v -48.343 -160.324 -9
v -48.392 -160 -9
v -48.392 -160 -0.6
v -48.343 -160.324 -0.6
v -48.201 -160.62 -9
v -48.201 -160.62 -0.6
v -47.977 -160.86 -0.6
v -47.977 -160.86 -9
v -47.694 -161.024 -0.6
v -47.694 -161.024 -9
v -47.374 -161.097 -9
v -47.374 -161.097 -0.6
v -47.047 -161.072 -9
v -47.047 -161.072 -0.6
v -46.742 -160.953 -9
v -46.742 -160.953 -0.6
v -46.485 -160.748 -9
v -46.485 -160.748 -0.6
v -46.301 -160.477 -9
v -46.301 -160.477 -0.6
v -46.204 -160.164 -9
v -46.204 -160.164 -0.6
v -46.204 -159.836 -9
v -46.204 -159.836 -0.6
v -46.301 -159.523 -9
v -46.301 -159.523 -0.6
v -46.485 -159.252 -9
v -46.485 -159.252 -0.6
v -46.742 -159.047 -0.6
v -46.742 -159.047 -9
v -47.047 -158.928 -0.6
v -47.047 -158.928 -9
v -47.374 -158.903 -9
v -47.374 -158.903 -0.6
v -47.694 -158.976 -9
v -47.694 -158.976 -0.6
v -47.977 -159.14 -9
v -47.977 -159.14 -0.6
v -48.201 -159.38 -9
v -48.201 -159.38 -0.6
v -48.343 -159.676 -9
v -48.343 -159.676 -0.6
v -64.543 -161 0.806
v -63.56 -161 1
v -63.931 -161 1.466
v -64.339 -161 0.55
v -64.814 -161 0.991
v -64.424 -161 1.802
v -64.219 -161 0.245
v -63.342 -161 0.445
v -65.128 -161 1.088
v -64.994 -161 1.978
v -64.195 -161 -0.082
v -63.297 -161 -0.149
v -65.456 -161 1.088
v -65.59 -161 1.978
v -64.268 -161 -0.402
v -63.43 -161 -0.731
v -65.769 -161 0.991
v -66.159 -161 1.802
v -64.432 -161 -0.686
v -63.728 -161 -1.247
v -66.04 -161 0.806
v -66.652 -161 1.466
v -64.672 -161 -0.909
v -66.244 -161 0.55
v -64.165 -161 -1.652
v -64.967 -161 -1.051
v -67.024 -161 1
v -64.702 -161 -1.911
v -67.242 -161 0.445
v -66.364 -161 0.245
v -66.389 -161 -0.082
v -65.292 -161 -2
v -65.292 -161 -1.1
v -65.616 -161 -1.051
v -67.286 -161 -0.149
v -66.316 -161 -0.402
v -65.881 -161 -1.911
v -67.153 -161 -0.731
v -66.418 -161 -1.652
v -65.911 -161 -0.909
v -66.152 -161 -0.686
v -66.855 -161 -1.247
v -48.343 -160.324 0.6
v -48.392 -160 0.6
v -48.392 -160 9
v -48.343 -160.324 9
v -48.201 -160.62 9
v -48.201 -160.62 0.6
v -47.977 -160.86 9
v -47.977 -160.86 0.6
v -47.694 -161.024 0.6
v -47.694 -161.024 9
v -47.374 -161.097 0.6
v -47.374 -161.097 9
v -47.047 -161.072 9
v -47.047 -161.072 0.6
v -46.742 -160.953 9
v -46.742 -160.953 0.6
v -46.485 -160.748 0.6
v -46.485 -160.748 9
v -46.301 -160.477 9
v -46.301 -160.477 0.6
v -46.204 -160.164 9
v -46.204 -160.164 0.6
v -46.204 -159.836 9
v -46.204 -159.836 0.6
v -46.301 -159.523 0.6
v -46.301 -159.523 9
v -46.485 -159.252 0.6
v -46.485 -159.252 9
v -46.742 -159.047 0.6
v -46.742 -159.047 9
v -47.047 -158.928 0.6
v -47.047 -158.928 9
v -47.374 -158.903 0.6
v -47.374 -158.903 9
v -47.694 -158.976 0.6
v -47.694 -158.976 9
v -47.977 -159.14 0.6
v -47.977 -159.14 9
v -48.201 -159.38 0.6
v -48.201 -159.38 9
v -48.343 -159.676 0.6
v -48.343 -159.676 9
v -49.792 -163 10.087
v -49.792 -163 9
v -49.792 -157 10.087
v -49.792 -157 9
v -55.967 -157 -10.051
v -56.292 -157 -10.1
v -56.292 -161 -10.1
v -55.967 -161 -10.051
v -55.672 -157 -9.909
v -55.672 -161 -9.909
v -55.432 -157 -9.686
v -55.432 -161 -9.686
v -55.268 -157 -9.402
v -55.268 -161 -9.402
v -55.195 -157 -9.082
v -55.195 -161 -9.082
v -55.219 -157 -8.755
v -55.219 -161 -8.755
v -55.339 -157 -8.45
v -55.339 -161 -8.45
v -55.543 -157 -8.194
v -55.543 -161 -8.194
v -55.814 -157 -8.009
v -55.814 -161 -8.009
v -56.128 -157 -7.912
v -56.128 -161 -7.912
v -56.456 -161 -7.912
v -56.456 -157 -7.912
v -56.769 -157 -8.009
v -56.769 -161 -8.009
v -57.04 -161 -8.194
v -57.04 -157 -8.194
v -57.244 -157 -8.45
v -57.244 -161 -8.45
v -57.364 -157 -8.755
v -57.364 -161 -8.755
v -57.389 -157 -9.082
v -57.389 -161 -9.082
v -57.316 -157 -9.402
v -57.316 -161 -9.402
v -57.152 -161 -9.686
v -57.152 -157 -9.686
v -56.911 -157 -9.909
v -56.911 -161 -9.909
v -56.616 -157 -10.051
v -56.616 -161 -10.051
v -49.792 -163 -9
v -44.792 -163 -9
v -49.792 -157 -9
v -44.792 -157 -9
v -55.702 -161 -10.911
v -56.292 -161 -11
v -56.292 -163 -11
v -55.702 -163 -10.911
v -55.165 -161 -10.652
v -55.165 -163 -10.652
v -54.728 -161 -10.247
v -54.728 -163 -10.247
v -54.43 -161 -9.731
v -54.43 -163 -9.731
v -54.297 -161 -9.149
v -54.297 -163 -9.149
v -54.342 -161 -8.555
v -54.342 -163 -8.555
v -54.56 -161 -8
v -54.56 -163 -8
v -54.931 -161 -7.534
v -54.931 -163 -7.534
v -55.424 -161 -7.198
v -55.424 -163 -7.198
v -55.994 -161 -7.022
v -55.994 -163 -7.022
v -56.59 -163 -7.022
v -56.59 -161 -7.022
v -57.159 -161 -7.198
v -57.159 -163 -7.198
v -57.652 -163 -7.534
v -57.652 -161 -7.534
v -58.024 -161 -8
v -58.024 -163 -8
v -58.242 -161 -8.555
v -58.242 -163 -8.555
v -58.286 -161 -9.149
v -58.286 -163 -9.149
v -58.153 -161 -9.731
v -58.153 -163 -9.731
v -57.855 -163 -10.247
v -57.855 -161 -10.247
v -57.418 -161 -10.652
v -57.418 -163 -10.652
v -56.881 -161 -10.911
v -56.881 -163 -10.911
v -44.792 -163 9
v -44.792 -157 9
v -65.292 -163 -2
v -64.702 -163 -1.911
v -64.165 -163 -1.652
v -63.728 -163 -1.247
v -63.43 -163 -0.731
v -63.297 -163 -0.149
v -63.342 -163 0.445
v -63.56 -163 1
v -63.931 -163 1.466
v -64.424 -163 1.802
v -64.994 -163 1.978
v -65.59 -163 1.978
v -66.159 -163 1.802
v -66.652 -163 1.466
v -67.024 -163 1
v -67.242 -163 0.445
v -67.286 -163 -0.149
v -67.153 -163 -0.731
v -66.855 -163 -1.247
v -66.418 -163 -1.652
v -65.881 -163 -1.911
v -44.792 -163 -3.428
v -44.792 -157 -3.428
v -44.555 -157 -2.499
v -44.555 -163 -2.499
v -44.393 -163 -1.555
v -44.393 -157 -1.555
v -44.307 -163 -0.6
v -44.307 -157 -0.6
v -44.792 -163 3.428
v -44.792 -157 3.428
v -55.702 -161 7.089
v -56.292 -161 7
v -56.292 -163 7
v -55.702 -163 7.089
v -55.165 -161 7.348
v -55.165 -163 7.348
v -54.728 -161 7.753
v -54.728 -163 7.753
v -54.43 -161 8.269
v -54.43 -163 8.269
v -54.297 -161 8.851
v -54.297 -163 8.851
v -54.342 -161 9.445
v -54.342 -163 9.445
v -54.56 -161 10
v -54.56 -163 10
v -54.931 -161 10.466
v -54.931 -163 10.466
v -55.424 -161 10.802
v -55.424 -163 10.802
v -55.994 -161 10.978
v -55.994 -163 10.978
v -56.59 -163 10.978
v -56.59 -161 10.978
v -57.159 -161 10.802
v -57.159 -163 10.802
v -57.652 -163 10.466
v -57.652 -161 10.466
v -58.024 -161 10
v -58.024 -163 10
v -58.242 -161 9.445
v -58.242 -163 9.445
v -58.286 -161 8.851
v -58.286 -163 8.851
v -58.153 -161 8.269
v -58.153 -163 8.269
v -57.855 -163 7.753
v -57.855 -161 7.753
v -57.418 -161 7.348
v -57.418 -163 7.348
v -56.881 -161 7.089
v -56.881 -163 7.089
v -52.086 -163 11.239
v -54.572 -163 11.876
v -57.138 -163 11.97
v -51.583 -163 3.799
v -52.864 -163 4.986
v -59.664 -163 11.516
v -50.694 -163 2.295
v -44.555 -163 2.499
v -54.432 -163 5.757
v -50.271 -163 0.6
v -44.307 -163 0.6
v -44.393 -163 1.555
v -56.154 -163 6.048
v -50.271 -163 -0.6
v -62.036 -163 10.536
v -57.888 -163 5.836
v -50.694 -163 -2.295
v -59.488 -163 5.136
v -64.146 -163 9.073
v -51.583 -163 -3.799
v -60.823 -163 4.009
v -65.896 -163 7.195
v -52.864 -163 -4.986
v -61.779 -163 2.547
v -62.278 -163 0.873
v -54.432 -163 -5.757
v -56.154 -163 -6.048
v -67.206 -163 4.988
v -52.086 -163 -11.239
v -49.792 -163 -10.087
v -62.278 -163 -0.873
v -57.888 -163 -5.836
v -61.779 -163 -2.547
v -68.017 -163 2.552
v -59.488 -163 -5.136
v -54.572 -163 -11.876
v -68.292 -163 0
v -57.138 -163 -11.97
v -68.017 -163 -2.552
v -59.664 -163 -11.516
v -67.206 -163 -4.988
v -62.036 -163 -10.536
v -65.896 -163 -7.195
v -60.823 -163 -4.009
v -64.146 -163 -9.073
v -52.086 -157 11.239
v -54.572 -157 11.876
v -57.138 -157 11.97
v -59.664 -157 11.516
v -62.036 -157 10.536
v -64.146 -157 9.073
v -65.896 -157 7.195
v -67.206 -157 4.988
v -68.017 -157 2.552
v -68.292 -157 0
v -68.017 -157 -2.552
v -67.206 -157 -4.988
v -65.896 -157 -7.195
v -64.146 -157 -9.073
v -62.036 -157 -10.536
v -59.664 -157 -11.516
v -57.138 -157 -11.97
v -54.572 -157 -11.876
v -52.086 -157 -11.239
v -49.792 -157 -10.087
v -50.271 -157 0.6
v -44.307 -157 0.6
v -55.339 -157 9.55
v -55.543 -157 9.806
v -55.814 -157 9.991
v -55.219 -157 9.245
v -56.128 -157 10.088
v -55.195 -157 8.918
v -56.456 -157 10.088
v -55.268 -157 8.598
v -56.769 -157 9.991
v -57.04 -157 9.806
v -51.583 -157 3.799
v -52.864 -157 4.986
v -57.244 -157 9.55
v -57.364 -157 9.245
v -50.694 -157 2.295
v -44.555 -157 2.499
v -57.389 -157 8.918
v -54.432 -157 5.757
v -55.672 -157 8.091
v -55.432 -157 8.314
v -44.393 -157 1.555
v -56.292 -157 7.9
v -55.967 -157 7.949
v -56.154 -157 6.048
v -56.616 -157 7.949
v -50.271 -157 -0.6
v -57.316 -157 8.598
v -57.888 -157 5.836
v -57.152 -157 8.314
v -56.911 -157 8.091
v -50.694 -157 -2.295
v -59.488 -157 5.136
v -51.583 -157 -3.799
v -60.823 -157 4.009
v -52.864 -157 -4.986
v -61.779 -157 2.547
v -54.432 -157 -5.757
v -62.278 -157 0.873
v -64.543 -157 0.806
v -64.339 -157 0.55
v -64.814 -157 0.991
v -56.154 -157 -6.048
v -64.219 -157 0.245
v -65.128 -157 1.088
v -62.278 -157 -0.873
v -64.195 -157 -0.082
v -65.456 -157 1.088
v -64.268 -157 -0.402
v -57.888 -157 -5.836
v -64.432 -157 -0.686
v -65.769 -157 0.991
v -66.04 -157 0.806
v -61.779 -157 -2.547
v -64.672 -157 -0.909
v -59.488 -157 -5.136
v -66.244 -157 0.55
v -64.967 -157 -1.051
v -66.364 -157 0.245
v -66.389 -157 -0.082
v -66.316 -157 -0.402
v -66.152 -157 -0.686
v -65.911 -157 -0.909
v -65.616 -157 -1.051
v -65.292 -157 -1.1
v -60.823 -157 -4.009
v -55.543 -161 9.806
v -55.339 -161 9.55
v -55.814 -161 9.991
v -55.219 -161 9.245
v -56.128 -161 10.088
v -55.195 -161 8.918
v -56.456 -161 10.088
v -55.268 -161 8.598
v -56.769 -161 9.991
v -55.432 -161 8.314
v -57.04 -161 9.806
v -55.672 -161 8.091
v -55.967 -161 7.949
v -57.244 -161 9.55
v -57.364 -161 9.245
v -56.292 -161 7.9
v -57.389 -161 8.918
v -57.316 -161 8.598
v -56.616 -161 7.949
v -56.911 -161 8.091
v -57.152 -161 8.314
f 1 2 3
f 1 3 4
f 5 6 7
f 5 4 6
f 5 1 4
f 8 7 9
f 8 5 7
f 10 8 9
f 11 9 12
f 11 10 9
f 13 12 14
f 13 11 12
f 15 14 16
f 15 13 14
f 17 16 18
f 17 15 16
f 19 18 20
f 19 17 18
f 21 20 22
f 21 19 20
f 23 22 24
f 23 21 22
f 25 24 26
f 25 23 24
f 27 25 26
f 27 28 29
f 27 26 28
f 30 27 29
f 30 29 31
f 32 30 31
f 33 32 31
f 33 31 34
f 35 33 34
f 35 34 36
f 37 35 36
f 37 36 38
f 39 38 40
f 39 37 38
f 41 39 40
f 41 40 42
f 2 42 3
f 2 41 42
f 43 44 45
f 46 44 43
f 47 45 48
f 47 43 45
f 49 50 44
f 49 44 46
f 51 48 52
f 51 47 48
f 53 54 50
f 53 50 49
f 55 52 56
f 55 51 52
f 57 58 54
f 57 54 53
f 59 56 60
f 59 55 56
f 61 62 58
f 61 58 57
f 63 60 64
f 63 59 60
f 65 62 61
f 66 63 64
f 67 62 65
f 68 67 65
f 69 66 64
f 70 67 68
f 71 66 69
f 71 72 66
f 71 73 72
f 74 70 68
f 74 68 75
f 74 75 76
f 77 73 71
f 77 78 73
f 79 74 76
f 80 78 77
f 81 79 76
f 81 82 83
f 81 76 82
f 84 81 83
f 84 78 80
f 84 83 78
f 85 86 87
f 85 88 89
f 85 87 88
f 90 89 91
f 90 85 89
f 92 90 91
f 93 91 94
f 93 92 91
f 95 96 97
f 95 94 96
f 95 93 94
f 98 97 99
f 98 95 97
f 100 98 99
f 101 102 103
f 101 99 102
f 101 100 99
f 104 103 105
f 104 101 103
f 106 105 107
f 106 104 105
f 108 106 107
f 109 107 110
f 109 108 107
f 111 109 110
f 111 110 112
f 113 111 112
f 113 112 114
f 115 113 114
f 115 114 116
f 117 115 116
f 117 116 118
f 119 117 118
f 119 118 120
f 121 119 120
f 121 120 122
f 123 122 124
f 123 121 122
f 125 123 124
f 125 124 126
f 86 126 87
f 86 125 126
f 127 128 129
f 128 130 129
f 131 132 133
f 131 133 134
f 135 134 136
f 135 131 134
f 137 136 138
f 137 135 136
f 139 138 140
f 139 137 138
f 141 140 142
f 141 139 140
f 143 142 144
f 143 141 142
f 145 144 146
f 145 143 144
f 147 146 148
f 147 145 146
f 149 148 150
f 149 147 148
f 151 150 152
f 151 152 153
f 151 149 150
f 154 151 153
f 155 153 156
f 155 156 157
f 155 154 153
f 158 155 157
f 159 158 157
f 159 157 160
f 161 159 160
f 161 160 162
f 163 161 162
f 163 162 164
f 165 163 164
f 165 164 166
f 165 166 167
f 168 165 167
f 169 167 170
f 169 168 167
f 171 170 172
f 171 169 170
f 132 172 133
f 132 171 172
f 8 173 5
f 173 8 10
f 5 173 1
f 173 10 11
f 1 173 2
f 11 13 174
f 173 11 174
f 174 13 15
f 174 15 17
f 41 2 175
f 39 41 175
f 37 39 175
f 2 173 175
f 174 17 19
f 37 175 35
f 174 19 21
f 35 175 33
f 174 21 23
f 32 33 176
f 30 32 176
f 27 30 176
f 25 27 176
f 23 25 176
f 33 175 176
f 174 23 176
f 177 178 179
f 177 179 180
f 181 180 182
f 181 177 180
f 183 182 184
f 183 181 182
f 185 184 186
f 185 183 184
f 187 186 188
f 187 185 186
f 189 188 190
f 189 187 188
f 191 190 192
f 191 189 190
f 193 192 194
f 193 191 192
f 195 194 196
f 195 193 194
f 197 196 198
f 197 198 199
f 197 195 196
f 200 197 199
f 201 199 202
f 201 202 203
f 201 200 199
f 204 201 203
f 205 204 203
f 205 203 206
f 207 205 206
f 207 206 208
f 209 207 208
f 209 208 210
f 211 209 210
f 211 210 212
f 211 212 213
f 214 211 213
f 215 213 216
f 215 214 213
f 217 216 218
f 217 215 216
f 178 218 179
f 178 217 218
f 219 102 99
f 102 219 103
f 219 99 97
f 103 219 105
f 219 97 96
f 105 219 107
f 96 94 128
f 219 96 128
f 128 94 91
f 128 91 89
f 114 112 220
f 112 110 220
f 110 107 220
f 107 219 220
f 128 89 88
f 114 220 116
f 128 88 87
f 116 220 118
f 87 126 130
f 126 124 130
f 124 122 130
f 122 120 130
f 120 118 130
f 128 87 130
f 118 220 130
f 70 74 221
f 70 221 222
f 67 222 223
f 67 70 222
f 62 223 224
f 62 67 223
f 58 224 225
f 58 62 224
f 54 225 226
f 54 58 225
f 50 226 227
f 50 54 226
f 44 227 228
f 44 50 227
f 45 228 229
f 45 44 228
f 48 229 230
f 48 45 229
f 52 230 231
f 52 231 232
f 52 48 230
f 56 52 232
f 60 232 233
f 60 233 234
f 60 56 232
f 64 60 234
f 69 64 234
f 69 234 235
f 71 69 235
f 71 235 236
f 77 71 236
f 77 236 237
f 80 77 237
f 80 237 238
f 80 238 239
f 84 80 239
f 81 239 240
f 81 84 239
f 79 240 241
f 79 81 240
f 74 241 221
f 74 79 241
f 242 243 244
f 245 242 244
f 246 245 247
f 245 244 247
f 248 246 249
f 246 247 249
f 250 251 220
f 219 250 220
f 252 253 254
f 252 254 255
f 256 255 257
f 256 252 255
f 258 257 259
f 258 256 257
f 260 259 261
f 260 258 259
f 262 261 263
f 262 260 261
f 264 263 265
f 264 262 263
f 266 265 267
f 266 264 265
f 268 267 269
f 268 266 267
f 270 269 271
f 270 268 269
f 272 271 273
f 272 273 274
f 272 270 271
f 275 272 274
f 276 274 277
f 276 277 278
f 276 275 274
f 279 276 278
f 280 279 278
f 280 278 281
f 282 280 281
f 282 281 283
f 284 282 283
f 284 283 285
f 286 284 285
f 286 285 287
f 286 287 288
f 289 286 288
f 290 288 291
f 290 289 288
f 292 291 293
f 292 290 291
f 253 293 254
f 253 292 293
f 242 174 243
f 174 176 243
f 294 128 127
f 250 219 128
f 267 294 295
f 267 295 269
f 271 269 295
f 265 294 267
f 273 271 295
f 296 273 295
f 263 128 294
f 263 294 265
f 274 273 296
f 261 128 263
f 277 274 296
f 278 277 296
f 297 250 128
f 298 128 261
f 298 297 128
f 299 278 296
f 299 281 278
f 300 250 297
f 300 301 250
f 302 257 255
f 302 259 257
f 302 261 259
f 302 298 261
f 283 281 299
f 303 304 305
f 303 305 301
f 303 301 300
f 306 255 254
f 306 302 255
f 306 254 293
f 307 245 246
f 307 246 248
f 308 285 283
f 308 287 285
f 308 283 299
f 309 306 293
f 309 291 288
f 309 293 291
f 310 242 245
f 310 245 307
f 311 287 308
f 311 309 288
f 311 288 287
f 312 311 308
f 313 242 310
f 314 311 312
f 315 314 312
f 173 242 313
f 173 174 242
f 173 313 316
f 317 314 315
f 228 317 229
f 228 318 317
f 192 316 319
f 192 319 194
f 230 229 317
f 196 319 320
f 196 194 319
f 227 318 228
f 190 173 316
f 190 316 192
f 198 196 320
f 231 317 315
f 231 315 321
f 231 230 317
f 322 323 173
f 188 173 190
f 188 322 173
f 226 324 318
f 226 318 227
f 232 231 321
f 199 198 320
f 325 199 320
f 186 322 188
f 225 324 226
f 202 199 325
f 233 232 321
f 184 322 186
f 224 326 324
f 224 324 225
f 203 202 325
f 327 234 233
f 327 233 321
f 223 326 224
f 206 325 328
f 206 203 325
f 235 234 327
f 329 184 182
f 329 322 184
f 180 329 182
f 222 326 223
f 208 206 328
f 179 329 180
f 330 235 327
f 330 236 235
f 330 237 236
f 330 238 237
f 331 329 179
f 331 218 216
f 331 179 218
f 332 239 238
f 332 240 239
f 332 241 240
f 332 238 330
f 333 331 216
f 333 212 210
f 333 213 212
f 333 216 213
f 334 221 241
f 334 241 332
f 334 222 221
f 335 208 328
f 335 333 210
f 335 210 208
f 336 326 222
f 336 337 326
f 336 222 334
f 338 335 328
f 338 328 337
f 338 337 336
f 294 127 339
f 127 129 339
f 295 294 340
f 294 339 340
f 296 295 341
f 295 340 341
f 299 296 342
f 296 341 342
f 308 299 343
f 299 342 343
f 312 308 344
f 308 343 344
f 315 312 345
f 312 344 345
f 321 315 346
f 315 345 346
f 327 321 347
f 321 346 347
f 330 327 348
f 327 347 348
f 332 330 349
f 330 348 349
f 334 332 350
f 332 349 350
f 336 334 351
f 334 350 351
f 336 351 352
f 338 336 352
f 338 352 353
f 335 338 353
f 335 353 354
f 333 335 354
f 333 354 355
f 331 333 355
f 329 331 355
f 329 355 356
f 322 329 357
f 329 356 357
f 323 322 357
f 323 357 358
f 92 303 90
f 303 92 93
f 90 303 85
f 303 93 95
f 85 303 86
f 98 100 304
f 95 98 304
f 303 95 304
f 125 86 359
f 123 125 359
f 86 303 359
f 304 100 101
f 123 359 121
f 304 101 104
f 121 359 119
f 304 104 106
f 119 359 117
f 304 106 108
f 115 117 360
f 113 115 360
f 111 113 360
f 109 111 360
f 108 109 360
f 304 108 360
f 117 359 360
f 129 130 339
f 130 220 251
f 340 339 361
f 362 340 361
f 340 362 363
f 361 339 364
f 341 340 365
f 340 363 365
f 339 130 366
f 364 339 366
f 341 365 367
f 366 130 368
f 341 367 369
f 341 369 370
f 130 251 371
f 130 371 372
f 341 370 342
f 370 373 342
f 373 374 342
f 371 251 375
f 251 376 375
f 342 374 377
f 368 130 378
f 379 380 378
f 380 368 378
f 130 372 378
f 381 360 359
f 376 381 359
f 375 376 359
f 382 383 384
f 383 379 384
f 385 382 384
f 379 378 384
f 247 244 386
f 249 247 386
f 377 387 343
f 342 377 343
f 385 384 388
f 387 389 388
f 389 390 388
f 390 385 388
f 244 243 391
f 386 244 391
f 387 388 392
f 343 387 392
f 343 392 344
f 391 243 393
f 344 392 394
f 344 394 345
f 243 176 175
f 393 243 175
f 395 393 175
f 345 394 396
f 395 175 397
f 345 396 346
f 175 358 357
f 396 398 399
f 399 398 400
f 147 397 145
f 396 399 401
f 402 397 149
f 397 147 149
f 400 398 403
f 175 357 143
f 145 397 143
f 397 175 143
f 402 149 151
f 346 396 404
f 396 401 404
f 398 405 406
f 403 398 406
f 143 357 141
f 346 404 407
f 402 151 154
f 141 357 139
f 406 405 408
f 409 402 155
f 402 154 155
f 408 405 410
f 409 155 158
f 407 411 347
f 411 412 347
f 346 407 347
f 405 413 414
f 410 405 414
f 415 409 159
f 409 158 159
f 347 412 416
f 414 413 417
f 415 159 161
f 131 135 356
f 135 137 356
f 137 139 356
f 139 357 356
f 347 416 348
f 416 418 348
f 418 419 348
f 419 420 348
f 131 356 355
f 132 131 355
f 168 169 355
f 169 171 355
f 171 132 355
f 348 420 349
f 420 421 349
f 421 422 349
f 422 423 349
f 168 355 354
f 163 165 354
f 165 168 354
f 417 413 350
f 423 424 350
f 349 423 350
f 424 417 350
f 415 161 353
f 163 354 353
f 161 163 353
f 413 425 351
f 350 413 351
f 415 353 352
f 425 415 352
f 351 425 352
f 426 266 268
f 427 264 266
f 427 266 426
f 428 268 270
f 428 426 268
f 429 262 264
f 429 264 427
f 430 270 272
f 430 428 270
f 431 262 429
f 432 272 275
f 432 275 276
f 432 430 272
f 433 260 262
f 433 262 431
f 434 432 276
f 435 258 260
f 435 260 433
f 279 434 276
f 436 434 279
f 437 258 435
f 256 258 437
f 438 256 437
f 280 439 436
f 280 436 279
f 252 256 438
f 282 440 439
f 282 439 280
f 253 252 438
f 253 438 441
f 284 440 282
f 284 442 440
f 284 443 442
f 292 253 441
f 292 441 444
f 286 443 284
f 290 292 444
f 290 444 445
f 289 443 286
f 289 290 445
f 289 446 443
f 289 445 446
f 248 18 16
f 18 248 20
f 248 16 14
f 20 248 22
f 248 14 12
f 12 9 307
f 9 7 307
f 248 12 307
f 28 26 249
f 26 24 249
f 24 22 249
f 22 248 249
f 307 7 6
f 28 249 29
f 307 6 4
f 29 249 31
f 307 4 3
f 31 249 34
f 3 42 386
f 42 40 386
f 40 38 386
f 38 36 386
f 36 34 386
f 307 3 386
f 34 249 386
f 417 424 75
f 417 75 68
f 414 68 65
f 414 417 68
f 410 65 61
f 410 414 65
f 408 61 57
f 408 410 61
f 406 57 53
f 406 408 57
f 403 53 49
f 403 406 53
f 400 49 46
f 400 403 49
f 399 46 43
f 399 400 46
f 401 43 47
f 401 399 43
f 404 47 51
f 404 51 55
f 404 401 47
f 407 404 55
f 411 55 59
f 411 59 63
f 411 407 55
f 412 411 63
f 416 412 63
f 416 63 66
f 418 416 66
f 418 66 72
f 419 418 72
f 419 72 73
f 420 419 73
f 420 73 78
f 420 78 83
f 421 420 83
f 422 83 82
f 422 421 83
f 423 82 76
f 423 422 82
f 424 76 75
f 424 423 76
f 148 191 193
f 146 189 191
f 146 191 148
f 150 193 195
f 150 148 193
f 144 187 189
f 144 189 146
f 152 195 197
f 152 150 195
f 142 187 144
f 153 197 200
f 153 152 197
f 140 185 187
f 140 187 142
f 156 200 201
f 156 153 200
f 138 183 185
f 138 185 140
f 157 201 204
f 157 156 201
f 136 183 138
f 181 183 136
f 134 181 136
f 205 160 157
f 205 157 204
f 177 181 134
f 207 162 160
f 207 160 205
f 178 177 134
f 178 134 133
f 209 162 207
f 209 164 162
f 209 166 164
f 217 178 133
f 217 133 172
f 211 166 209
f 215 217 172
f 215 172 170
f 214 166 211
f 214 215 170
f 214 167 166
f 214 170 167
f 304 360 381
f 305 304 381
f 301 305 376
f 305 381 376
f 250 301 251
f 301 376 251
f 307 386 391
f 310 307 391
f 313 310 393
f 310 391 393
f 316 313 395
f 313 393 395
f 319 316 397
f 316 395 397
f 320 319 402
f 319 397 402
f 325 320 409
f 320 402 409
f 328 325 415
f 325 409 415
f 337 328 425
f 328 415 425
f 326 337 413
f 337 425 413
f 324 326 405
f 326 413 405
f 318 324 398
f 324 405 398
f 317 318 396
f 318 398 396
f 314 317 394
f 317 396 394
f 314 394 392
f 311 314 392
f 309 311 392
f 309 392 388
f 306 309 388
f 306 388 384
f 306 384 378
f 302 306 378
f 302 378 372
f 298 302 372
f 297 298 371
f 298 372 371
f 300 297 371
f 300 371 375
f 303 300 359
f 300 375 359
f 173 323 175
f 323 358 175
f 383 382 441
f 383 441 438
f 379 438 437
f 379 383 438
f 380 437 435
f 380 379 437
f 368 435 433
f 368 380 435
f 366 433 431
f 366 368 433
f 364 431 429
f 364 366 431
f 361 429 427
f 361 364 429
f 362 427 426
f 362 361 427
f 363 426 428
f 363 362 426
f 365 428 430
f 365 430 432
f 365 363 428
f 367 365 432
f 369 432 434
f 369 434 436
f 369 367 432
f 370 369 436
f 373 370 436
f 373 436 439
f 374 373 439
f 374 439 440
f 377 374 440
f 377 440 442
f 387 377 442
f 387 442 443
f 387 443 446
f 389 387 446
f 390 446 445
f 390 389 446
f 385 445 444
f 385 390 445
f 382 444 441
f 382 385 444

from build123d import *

# Parameters (mm, degrees)
MAIN_PROFILE_SKETCH_R          = 1.1
MAIN_EXTRUSION_DEPTH           = 4
DETAIL_PROFILE_2_SKETCH_R      = 2
DETAIL_EXTRUSION_2_DEPTH       = 2
CROSS_BOLT_CLEARANCE_PROFILE_R = 1.1
CROSS_BOLT_CLEARANCE_DEPTH     = 24


with BuildPart() as part:
    # Main Profile Sketch → Main Extrusion (new body)
    with BuildSketch(Plane(origin=(0, -157, 0), x_dir=(-1, 0, 0), z_dir=(0, -1, 0))):
        with BuildLine():
            Line((44.791651246, -3.4278273), (44.791651246, -9))
            Line((44.791651246, -9), (49.791651246, -9))
            Line((49.791651246, -9), (49.791651246, -10.087120501))
            ThreePointArc((49.791651246, -10.087120501), (68.291651246, 0), (49.791651246, 10.087120501))
            Line((49.791651246, 10.087120501), (49.791651246, 9))
            Line((49.791651246, 9), (44.791651246, 9))
            Line((44.791651246, 9), (44.791651246, 3.4278273))
            ThreePointArc((44.791651246, 3.4278273), (44.46433761, 2.02846054), (44.306660633, 0.6))
            Line((44.306660633, 0.6), (50.27147683, 0.6))
            ThreePointArc((50.27147683, 0.6), (62.341651246, 0), (50.27147683, -0.6))
            Line((50.27147683, -0.6), (44.306660633, -0.6))
            ThreePointArc((44.306660633, -0.6), (44.46433761, -2.02846054), (44.791651246, -3.4278273))
        make_face()
        with Locations(Location((65.291651246, 0, 0), (0, 0, 90))):
            Circle(MAIN_PROFILE_SKETCH_R, mode=Mode.SUBTRACT)
        with Locations(Location((56.291651246, 9, 0), (0, 0, 90))):
            Circle(MAIN_PROFILE_SKETCH_R, mode=Mode.SUBTRACT)
        with Locations(Location((56.291651246, -9, 0), (0, 0, 90))):
            Circle(MAIN_PROFILE_SKETCH_R, mode=Mode.SUBTRACT)
    extrude(amount=MAIN_EXTRUSION_DEPTH)

    # Detail Profile 2 Sketch → Detail Extrusion 2 (add)
    with BuildSketch(Plane(origin=(0, -161, 0), x_dir=(-1, 0, 0), z_dir=(0, -1, 0))):
        with BuildLine():
            Line((44.791651246, -3.4278273), (44.791651246, -9))
            Line((44.791651246, -9), (49.791651246, -9))
            Line((49.791651246, -9), (49.791651246, -10.087120501))
            ThreePointArc((49.791651246, -10.087120501), (68.291651246, 0), (49.791651246, 10.087120501))
            Line((49.791651246, 10.087120501), (49.791651246, 9))
            Line((49.791651246, 9), (44.791651246, 9))
            Line((44.791651246, 9), (44.791651246, 3.4278273))
            ThreePointArc((44.791651246, 3.4278273), (44.46433761, 2.02846054), (44.306660633, 0.6))
            Line((44.306660633, 0.6), (50.27147683, 0.6))
            ThreePointArc((50.27147683, 0.6), (62.341651246, 0), (50.27147683, -0.6))
            Line((50.27147683, -0.6), (44.306660633, -0.6))
            ThreePointArc((44.306660633, -0.6), (44.46433761, -2.02846054), (44.791651246, -3.4278273))
        make_face()
        with Locations(Location((65.291651246, 0, 0), (0, 0, 90))):
            Circle(DETAIL_PROFILE_2_SKETCH_R, mode=Mode.SUBTRACT)
        with Locations(Location((56.291651246, 9, 0), (0, 0, 90))):
            Circle(DETAIL_PROFILE_2_SKETCH_R, mode=Mode.SUBTRACT)
        with Locations(Location((56.291651246, -9, 0), (0, 0, 90))):
            Circle(DETAIL_PROFILE_2_SKETCH_R, mode=Mode.SUBTRACT)
    extrude(amount=DETAIL_EXTRUSION_2_DEPTH)

    # Cross Bolt Clearance profile → Cross Bolt Clearance (cut)
    with BuildSketch(Plane.XY.offset(-12)):
        with Locations(Location((-47.291651246, -160, 0), (0, 0, 180))):
            Circle(CROSS_BOLT_CLEARANCE_PROFILE_R)
    extrude(amount=CROSS_BOLT_CLEARANCE_DEPTH, mode=Mode.SUBTRACT)


solid = part.part
